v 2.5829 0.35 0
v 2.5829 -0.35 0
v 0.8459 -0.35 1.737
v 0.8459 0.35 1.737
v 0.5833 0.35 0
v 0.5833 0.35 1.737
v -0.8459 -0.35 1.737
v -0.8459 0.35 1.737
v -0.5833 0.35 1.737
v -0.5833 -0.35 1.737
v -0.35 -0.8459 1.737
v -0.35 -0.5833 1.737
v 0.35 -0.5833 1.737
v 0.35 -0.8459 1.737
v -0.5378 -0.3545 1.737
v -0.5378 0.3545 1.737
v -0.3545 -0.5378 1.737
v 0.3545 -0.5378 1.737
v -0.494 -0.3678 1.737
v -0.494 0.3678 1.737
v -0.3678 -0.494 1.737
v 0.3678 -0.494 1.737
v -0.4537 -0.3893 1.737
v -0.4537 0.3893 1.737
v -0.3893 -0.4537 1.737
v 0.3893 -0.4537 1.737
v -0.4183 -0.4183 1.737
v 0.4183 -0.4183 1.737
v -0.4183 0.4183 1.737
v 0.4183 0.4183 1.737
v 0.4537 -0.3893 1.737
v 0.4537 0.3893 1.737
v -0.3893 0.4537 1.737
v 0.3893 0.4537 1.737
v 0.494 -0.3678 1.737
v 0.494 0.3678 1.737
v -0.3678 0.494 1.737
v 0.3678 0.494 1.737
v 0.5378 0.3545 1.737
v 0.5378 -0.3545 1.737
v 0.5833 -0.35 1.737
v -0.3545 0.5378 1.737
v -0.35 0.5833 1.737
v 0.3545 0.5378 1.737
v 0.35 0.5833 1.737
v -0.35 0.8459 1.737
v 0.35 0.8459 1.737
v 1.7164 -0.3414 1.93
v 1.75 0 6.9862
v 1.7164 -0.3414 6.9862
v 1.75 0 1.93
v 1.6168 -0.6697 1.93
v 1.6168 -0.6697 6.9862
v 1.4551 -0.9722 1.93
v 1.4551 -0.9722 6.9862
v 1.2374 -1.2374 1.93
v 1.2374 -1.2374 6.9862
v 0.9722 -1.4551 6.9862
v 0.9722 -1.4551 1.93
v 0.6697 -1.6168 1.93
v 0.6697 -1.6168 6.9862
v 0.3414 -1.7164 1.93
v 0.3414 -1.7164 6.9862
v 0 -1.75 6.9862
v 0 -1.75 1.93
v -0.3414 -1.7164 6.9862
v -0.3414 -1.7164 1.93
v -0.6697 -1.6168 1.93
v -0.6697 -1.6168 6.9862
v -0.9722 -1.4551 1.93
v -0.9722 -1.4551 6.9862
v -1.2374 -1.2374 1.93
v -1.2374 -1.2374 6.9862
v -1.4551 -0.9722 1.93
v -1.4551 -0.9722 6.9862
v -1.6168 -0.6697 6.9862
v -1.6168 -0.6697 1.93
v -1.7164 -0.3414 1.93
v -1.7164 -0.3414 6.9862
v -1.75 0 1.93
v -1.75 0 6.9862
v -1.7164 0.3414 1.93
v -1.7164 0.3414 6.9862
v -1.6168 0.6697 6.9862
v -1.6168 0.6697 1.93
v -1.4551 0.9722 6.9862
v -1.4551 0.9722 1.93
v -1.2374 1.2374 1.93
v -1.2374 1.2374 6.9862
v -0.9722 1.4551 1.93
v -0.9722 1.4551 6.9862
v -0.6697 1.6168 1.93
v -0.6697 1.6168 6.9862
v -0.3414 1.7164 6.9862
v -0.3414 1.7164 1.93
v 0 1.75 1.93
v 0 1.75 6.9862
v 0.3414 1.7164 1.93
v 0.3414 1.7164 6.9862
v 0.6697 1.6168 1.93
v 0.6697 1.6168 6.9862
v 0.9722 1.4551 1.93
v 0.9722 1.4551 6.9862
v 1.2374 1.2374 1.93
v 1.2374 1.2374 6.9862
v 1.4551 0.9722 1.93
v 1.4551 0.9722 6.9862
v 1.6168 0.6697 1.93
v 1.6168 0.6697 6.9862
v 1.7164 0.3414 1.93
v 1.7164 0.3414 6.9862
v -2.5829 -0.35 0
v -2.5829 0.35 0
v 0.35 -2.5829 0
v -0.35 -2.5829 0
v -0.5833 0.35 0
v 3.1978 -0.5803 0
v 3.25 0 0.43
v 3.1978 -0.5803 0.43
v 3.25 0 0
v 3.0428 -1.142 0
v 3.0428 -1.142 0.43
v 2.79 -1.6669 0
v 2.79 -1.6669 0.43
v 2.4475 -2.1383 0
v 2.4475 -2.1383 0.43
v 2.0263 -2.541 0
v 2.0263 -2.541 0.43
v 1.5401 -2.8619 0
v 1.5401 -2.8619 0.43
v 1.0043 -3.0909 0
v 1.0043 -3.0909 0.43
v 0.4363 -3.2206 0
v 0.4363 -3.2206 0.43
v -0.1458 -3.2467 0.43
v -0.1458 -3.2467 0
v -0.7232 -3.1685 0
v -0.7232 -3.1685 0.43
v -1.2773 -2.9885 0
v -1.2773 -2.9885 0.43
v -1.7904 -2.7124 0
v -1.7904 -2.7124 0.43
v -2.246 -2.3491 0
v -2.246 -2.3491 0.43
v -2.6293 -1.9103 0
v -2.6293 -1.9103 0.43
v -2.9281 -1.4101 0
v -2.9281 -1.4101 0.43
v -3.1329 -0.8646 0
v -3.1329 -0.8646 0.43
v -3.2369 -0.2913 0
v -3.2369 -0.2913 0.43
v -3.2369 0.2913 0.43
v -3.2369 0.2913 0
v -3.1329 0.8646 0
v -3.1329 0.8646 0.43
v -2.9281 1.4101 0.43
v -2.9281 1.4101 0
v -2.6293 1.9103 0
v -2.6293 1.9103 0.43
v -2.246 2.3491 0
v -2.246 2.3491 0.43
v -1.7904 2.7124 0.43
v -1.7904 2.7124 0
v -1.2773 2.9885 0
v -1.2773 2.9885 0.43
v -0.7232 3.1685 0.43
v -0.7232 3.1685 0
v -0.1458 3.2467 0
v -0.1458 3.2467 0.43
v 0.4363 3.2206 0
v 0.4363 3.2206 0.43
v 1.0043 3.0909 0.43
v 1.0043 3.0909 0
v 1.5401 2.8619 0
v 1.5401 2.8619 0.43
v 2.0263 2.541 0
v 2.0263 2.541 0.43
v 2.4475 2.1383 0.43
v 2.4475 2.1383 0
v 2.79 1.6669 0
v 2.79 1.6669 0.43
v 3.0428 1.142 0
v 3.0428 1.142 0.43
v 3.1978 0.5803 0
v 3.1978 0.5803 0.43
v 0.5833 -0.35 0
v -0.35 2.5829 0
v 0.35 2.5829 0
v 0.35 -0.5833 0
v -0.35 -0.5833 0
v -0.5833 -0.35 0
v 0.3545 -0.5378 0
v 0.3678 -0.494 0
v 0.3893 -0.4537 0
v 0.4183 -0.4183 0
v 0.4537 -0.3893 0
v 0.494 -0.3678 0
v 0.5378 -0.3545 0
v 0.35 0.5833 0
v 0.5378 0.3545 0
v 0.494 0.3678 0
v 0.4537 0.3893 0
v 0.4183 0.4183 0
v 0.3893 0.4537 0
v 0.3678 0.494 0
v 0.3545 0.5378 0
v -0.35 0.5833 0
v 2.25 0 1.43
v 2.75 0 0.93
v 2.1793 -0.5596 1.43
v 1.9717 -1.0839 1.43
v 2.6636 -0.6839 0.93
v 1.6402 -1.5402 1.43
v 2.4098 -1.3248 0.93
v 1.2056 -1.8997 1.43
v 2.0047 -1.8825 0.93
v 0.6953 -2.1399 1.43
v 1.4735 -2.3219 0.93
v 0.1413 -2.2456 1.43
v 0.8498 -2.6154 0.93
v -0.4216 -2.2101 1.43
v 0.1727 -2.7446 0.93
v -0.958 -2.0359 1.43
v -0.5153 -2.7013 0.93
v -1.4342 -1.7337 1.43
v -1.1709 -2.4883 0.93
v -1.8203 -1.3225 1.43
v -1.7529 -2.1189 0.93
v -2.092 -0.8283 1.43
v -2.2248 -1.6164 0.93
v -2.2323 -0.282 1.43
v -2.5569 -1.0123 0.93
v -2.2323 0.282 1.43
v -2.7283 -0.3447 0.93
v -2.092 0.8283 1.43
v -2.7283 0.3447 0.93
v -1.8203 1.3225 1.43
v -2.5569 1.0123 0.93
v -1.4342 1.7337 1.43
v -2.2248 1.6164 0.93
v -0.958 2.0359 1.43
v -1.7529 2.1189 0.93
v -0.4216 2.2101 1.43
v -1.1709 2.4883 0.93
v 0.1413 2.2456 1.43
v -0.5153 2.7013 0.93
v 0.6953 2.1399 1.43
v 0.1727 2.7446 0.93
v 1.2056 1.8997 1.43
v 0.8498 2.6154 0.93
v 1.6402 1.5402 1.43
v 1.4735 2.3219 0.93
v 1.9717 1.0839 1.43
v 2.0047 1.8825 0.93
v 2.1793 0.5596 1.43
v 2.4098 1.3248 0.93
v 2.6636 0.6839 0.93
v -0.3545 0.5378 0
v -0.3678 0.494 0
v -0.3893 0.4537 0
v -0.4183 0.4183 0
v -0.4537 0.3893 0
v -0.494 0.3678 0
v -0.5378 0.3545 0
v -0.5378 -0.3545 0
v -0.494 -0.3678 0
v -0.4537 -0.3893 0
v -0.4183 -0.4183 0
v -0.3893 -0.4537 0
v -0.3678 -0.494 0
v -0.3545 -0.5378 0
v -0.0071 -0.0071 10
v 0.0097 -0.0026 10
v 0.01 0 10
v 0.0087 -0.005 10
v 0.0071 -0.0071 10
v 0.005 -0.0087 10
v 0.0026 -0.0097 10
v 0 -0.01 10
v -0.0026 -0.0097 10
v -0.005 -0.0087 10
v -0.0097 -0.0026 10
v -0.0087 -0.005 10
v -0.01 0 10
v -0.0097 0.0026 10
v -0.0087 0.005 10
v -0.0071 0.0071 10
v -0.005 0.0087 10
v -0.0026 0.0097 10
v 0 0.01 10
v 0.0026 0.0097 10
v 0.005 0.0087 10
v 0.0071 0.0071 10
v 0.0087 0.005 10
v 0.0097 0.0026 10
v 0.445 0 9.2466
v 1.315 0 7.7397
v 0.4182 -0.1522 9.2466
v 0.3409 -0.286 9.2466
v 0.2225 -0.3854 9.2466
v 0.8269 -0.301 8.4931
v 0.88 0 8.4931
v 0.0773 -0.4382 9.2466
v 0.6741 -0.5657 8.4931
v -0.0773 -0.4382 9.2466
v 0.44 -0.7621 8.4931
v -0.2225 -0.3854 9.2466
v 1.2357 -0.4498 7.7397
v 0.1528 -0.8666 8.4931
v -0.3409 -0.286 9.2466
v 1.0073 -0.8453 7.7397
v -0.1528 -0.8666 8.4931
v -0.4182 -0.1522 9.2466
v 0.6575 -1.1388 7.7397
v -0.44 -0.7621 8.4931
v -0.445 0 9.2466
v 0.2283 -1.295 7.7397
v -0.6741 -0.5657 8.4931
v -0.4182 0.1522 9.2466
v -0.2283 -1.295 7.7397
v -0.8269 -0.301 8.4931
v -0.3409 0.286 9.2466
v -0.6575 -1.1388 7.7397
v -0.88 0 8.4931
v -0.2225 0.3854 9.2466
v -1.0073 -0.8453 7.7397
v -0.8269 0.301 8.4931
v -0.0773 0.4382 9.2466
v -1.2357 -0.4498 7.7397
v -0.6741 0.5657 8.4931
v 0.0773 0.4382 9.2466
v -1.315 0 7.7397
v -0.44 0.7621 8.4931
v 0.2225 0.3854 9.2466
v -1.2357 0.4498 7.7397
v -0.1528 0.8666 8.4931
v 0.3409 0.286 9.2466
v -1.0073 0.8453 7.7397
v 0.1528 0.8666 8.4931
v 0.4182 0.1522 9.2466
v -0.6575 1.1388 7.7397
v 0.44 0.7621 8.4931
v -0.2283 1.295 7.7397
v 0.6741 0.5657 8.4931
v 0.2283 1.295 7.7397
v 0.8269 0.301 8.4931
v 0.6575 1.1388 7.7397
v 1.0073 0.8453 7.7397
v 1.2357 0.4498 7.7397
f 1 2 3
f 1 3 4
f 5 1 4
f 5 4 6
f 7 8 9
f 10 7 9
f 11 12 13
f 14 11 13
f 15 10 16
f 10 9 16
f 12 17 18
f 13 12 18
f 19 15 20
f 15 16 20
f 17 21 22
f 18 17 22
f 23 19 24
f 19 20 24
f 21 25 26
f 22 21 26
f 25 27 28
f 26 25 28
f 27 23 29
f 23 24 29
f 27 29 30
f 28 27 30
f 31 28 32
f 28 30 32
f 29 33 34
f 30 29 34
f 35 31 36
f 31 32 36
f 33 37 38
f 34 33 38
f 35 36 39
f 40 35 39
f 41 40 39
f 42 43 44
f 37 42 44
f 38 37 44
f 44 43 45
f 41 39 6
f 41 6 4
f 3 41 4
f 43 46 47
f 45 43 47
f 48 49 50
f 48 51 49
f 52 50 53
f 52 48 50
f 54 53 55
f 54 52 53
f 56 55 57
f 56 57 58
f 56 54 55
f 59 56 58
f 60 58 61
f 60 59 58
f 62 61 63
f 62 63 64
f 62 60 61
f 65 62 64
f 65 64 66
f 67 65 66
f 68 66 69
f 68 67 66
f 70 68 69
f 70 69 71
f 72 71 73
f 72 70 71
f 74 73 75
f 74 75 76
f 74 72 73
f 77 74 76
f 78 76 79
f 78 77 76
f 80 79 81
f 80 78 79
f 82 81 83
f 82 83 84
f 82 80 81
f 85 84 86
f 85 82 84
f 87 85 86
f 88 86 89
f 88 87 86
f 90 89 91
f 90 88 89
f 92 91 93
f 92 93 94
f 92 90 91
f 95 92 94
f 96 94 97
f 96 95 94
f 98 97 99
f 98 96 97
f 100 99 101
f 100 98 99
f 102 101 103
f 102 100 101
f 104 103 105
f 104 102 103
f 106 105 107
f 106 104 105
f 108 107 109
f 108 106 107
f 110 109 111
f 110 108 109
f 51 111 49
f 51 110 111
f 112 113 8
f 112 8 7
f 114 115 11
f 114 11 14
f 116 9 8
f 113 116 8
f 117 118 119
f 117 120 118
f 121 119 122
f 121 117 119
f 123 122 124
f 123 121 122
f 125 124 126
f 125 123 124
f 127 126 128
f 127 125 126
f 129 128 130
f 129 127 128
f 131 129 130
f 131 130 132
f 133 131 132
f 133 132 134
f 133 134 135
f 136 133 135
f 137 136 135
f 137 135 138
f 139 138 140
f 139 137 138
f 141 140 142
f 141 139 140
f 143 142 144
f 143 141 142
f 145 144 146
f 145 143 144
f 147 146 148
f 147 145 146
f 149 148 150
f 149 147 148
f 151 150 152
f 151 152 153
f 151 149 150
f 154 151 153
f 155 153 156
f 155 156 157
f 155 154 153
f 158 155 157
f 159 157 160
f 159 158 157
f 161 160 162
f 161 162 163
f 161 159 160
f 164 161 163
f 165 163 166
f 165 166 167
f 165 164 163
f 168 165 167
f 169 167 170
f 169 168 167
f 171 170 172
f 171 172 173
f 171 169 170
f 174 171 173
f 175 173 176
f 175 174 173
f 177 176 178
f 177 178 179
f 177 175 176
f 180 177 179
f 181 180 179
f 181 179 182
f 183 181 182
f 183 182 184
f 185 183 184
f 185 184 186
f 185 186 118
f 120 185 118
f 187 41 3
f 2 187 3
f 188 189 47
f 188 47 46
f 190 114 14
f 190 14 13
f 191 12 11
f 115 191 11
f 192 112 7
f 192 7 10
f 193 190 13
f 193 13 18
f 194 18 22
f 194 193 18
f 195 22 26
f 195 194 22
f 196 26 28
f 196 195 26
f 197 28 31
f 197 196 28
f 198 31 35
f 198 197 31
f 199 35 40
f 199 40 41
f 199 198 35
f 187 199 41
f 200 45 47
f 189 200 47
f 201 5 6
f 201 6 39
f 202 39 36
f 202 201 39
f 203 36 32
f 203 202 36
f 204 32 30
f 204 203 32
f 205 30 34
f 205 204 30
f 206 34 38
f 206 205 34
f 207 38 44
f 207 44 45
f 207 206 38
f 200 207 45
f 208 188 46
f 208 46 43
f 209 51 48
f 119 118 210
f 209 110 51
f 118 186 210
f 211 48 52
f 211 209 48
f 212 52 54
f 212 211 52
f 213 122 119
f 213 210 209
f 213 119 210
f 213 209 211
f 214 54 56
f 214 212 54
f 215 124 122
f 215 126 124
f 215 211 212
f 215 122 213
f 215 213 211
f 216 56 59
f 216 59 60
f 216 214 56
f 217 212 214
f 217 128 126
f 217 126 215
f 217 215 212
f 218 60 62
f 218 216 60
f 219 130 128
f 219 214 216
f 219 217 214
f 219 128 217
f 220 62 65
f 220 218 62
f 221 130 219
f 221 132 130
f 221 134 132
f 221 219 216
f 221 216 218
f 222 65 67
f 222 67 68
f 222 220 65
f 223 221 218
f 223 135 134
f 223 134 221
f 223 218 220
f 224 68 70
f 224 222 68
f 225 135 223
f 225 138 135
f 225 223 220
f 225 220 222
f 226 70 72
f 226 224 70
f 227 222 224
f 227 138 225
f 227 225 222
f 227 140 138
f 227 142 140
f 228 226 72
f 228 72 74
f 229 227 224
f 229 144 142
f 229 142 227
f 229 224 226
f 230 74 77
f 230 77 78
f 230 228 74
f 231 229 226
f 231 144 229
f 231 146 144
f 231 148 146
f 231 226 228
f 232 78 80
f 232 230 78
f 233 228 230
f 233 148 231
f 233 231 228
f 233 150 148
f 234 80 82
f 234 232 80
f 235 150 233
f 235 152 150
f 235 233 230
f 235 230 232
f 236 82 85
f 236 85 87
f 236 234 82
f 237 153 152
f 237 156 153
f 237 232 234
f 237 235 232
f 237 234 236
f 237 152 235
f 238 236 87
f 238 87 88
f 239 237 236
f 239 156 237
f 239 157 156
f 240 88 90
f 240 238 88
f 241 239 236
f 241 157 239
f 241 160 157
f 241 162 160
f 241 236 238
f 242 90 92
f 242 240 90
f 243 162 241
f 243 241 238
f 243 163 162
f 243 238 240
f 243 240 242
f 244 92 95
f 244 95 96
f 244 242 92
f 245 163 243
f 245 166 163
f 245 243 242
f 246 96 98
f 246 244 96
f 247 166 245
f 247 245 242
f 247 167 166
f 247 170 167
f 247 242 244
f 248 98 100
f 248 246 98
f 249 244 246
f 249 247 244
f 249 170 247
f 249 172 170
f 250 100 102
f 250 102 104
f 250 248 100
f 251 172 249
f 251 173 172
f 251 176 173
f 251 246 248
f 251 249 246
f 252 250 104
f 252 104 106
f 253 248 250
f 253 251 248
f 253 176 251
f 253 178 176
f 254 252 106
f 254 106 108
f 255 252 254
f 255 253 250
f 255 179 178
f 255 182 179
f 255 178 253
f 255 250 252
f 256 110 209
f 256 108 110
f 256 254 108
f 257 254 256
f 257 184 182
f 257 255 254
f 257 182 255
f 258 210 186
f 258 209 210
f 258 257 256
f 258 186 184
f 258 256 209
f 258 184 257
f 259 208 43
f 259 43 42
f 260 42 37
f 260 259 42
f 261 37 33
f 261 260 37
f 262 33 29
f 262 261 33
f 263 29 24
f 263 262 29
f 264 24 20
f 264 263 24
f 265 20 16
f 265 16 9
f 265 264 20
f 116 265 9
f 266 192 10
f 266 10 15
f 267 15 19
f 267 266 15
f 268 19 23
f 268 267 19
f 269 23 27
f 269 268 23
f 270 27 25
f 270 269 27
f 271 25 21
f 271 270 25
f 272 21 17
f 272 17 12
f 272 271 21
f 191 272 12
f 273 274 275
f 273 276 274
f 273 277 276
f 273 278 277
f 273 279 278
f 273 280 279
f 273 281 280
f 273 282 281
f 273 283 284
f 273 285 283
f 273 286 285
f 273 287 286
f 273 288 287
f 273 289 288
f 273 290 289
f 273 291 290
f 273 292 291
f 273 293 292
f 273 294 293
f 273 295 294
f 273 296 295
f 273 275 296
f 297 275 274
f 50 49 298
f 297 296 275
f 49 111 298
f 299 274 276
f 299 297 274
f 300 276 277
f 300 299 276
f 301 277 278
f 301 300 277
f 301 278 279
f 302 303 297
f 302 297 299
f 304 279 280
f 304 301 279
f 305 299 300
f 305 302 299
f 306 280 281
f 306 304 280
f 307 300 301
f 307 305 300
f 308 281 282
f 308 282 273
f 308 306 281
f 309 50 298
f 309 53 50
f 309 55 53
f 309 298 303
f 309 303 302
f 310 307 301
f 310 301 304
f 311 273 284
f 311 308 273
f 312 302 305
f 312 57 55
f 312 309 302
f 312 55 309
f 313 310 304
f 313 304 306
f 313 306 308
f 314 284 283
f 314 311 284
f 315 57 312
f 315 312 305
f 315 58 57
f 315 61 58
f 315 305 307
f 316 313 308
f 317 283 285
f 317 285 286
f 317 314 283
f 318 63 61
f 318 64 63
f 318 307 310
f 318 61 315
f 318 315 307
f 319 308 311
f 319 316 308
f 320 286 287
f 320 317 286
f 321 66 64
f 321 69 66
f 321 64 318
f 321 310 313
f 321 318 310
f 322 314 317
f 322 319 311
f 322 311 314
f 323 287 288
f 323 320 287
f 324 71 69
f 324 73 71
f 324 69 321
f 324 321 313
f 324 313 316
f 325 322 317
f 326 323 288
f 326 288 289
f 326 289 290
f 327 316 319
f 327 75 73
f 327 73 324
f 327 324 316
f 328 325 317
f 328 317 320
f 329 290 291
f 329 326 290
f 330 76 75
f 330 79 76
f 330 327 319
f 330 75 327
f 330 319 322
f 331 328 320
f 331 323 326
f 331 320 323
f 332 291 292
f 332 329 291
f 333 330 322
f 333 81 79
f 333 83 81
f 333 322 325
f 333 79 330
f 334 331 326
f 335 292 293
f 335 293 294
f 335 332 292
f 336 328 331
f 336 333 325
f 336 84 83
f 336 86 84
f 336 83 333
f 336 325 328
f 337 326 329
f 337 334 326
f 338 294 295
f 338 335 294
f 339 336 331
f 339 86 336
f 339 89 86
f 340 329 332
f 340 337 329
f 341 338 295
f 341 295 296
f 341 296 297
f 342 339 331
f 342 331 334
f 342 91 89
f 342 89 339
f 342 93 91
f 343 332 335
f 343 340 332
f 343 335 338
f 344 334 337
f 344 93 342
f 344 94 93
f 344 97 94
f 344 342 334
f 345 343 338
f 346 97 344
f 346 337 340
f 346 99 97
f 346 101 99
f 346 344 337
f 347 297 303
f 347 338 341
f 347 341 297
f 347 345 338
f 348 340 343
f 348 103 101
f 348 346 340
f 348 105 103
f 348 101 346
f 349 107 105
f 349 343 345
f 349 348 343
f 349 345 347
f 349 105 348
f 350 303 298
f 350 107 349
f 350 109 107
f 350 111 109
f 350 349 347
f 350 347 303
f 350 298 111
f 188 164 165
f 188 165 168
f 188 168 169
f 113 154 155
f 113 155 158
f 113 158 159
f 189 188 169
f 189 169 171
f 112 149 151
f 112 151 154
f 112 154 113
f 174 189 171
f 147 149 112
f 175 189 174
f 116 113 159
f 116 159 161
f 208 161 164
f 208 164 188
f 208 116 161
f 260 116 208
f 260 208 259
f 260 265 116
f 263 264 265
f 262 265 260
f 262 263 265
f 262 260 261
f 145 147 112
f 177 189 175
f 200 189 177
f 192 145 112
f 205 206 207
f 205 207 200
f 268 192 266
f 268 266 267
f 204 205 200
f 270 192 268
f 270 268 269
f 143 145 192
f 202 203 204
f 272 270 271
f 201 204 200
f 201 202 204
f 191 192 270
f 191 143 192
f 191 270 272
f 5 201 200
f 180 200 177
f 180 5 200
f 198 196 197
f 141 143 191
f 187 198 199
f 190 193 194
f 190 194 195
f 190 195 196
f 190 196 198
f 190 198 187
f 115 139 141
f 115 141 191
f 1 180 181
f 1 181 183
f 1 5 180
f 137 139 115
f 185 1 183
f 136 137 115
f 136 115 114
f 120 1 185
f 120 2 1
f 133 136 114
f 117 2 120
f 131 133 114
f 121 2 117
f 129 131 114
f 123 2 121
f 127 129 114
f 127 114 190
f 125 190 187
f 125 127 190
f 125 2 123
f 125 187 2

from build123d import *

# Parameters (mm, degrees)
CUT_EXTRUDE1_DEPTH = 1.737
DRAFT1_ANGLE       = 45


with BuildPart() as part:
    # Sketch1 → Revolve1 (revolve)
    with BuildSketch(Plane(origin=(0, 0, 0), x_dir=(1, 0, 0), z_dir=(0, 1, 0))):
        Polygon((0, 0), (0, -10), (0.01, -10), (1.75, -6.986231595), (1.75, -1.93), (3.25, -0.43), (3.25, 0), align=None)
    revolve(axis=Axis((0, 0, 0), (0, 0, -1)))

    # Sketch2 → Cut-Extrude1 (cut)
    with BuildSketch(Plane(origin=(0, 0, 0), x_dir=(-1, 0, 0), z_dir=(0, 0, -1))):
        with BuildLine():
            Line((-0.35, 0.583333333), (-0.35, 0.845898975))
            Line((-0.35, 0.845898975), (0.35, 0.845898975))
            Line((0.35, 0.845898975), (0.35, 0.583333333))
            ThreePointArc((0.35, 0.583333333), (0.418341751, 0.418341751), (0.583333333, 0.35))
            Line((0.583333333, 0.35), (0.845898975, 0.35))
            Line((0.845898975, 0.35), (0.845898975, -0.35))
            Line((0.845898975, -0.35), (0.583333333, -0.35))
            ThreePointArc((0.583333333, -0.35), (0.418341751, -0.418341751), (0.35, -0.583333333))
            Line((0.35, -0.583333333), (0.35, -0.845898975))
            Line((0.35, -0.845898975), (-0.35, -0.845898975))
            Line((-0.35, -0.845898975), (-0.35, -0.583333333))
            ThreePointArc((-0.35, -0.583333333), (-0.418341751, -0.418341751), (-0.583333333, -0.35))
            Line((-0.583333333, -0.35), (-0.845898975, -0.35))
            Line((-0.845898975, -0.35), (-0.845898975, 0.35))
            Line((-0.845898975, 0.35), (-0.583333333, 0.35))
            ThreePointArc((-0.583333333, 0.35), (-0.418341751, 0.418341751), (-0.35, 0.583333333))
        make_face()
    extrude(amount=-CUT_EXTRUDE1_DEPTH, mode=Mode.SUBTRACT)

    # Draft1
    draft1_faces = [part.faces().sort_by_distance(p)[0] for p in [
        (0, -0.845898975, 0.8685),
        (-0.845898975, 0, 0.8685),
        (0.845898975, 0, 0.8685),
        (0, 0.845898975, 0.8685),
    ]]
    draft(draft1_faces, Plane(origin=(-0.583333333, 0.583333333, 1.737), x_dir=(-1, 0, 0), z_dir=(0, 0, -1)), DRAFT1_ANGLE)


solid = part.part
